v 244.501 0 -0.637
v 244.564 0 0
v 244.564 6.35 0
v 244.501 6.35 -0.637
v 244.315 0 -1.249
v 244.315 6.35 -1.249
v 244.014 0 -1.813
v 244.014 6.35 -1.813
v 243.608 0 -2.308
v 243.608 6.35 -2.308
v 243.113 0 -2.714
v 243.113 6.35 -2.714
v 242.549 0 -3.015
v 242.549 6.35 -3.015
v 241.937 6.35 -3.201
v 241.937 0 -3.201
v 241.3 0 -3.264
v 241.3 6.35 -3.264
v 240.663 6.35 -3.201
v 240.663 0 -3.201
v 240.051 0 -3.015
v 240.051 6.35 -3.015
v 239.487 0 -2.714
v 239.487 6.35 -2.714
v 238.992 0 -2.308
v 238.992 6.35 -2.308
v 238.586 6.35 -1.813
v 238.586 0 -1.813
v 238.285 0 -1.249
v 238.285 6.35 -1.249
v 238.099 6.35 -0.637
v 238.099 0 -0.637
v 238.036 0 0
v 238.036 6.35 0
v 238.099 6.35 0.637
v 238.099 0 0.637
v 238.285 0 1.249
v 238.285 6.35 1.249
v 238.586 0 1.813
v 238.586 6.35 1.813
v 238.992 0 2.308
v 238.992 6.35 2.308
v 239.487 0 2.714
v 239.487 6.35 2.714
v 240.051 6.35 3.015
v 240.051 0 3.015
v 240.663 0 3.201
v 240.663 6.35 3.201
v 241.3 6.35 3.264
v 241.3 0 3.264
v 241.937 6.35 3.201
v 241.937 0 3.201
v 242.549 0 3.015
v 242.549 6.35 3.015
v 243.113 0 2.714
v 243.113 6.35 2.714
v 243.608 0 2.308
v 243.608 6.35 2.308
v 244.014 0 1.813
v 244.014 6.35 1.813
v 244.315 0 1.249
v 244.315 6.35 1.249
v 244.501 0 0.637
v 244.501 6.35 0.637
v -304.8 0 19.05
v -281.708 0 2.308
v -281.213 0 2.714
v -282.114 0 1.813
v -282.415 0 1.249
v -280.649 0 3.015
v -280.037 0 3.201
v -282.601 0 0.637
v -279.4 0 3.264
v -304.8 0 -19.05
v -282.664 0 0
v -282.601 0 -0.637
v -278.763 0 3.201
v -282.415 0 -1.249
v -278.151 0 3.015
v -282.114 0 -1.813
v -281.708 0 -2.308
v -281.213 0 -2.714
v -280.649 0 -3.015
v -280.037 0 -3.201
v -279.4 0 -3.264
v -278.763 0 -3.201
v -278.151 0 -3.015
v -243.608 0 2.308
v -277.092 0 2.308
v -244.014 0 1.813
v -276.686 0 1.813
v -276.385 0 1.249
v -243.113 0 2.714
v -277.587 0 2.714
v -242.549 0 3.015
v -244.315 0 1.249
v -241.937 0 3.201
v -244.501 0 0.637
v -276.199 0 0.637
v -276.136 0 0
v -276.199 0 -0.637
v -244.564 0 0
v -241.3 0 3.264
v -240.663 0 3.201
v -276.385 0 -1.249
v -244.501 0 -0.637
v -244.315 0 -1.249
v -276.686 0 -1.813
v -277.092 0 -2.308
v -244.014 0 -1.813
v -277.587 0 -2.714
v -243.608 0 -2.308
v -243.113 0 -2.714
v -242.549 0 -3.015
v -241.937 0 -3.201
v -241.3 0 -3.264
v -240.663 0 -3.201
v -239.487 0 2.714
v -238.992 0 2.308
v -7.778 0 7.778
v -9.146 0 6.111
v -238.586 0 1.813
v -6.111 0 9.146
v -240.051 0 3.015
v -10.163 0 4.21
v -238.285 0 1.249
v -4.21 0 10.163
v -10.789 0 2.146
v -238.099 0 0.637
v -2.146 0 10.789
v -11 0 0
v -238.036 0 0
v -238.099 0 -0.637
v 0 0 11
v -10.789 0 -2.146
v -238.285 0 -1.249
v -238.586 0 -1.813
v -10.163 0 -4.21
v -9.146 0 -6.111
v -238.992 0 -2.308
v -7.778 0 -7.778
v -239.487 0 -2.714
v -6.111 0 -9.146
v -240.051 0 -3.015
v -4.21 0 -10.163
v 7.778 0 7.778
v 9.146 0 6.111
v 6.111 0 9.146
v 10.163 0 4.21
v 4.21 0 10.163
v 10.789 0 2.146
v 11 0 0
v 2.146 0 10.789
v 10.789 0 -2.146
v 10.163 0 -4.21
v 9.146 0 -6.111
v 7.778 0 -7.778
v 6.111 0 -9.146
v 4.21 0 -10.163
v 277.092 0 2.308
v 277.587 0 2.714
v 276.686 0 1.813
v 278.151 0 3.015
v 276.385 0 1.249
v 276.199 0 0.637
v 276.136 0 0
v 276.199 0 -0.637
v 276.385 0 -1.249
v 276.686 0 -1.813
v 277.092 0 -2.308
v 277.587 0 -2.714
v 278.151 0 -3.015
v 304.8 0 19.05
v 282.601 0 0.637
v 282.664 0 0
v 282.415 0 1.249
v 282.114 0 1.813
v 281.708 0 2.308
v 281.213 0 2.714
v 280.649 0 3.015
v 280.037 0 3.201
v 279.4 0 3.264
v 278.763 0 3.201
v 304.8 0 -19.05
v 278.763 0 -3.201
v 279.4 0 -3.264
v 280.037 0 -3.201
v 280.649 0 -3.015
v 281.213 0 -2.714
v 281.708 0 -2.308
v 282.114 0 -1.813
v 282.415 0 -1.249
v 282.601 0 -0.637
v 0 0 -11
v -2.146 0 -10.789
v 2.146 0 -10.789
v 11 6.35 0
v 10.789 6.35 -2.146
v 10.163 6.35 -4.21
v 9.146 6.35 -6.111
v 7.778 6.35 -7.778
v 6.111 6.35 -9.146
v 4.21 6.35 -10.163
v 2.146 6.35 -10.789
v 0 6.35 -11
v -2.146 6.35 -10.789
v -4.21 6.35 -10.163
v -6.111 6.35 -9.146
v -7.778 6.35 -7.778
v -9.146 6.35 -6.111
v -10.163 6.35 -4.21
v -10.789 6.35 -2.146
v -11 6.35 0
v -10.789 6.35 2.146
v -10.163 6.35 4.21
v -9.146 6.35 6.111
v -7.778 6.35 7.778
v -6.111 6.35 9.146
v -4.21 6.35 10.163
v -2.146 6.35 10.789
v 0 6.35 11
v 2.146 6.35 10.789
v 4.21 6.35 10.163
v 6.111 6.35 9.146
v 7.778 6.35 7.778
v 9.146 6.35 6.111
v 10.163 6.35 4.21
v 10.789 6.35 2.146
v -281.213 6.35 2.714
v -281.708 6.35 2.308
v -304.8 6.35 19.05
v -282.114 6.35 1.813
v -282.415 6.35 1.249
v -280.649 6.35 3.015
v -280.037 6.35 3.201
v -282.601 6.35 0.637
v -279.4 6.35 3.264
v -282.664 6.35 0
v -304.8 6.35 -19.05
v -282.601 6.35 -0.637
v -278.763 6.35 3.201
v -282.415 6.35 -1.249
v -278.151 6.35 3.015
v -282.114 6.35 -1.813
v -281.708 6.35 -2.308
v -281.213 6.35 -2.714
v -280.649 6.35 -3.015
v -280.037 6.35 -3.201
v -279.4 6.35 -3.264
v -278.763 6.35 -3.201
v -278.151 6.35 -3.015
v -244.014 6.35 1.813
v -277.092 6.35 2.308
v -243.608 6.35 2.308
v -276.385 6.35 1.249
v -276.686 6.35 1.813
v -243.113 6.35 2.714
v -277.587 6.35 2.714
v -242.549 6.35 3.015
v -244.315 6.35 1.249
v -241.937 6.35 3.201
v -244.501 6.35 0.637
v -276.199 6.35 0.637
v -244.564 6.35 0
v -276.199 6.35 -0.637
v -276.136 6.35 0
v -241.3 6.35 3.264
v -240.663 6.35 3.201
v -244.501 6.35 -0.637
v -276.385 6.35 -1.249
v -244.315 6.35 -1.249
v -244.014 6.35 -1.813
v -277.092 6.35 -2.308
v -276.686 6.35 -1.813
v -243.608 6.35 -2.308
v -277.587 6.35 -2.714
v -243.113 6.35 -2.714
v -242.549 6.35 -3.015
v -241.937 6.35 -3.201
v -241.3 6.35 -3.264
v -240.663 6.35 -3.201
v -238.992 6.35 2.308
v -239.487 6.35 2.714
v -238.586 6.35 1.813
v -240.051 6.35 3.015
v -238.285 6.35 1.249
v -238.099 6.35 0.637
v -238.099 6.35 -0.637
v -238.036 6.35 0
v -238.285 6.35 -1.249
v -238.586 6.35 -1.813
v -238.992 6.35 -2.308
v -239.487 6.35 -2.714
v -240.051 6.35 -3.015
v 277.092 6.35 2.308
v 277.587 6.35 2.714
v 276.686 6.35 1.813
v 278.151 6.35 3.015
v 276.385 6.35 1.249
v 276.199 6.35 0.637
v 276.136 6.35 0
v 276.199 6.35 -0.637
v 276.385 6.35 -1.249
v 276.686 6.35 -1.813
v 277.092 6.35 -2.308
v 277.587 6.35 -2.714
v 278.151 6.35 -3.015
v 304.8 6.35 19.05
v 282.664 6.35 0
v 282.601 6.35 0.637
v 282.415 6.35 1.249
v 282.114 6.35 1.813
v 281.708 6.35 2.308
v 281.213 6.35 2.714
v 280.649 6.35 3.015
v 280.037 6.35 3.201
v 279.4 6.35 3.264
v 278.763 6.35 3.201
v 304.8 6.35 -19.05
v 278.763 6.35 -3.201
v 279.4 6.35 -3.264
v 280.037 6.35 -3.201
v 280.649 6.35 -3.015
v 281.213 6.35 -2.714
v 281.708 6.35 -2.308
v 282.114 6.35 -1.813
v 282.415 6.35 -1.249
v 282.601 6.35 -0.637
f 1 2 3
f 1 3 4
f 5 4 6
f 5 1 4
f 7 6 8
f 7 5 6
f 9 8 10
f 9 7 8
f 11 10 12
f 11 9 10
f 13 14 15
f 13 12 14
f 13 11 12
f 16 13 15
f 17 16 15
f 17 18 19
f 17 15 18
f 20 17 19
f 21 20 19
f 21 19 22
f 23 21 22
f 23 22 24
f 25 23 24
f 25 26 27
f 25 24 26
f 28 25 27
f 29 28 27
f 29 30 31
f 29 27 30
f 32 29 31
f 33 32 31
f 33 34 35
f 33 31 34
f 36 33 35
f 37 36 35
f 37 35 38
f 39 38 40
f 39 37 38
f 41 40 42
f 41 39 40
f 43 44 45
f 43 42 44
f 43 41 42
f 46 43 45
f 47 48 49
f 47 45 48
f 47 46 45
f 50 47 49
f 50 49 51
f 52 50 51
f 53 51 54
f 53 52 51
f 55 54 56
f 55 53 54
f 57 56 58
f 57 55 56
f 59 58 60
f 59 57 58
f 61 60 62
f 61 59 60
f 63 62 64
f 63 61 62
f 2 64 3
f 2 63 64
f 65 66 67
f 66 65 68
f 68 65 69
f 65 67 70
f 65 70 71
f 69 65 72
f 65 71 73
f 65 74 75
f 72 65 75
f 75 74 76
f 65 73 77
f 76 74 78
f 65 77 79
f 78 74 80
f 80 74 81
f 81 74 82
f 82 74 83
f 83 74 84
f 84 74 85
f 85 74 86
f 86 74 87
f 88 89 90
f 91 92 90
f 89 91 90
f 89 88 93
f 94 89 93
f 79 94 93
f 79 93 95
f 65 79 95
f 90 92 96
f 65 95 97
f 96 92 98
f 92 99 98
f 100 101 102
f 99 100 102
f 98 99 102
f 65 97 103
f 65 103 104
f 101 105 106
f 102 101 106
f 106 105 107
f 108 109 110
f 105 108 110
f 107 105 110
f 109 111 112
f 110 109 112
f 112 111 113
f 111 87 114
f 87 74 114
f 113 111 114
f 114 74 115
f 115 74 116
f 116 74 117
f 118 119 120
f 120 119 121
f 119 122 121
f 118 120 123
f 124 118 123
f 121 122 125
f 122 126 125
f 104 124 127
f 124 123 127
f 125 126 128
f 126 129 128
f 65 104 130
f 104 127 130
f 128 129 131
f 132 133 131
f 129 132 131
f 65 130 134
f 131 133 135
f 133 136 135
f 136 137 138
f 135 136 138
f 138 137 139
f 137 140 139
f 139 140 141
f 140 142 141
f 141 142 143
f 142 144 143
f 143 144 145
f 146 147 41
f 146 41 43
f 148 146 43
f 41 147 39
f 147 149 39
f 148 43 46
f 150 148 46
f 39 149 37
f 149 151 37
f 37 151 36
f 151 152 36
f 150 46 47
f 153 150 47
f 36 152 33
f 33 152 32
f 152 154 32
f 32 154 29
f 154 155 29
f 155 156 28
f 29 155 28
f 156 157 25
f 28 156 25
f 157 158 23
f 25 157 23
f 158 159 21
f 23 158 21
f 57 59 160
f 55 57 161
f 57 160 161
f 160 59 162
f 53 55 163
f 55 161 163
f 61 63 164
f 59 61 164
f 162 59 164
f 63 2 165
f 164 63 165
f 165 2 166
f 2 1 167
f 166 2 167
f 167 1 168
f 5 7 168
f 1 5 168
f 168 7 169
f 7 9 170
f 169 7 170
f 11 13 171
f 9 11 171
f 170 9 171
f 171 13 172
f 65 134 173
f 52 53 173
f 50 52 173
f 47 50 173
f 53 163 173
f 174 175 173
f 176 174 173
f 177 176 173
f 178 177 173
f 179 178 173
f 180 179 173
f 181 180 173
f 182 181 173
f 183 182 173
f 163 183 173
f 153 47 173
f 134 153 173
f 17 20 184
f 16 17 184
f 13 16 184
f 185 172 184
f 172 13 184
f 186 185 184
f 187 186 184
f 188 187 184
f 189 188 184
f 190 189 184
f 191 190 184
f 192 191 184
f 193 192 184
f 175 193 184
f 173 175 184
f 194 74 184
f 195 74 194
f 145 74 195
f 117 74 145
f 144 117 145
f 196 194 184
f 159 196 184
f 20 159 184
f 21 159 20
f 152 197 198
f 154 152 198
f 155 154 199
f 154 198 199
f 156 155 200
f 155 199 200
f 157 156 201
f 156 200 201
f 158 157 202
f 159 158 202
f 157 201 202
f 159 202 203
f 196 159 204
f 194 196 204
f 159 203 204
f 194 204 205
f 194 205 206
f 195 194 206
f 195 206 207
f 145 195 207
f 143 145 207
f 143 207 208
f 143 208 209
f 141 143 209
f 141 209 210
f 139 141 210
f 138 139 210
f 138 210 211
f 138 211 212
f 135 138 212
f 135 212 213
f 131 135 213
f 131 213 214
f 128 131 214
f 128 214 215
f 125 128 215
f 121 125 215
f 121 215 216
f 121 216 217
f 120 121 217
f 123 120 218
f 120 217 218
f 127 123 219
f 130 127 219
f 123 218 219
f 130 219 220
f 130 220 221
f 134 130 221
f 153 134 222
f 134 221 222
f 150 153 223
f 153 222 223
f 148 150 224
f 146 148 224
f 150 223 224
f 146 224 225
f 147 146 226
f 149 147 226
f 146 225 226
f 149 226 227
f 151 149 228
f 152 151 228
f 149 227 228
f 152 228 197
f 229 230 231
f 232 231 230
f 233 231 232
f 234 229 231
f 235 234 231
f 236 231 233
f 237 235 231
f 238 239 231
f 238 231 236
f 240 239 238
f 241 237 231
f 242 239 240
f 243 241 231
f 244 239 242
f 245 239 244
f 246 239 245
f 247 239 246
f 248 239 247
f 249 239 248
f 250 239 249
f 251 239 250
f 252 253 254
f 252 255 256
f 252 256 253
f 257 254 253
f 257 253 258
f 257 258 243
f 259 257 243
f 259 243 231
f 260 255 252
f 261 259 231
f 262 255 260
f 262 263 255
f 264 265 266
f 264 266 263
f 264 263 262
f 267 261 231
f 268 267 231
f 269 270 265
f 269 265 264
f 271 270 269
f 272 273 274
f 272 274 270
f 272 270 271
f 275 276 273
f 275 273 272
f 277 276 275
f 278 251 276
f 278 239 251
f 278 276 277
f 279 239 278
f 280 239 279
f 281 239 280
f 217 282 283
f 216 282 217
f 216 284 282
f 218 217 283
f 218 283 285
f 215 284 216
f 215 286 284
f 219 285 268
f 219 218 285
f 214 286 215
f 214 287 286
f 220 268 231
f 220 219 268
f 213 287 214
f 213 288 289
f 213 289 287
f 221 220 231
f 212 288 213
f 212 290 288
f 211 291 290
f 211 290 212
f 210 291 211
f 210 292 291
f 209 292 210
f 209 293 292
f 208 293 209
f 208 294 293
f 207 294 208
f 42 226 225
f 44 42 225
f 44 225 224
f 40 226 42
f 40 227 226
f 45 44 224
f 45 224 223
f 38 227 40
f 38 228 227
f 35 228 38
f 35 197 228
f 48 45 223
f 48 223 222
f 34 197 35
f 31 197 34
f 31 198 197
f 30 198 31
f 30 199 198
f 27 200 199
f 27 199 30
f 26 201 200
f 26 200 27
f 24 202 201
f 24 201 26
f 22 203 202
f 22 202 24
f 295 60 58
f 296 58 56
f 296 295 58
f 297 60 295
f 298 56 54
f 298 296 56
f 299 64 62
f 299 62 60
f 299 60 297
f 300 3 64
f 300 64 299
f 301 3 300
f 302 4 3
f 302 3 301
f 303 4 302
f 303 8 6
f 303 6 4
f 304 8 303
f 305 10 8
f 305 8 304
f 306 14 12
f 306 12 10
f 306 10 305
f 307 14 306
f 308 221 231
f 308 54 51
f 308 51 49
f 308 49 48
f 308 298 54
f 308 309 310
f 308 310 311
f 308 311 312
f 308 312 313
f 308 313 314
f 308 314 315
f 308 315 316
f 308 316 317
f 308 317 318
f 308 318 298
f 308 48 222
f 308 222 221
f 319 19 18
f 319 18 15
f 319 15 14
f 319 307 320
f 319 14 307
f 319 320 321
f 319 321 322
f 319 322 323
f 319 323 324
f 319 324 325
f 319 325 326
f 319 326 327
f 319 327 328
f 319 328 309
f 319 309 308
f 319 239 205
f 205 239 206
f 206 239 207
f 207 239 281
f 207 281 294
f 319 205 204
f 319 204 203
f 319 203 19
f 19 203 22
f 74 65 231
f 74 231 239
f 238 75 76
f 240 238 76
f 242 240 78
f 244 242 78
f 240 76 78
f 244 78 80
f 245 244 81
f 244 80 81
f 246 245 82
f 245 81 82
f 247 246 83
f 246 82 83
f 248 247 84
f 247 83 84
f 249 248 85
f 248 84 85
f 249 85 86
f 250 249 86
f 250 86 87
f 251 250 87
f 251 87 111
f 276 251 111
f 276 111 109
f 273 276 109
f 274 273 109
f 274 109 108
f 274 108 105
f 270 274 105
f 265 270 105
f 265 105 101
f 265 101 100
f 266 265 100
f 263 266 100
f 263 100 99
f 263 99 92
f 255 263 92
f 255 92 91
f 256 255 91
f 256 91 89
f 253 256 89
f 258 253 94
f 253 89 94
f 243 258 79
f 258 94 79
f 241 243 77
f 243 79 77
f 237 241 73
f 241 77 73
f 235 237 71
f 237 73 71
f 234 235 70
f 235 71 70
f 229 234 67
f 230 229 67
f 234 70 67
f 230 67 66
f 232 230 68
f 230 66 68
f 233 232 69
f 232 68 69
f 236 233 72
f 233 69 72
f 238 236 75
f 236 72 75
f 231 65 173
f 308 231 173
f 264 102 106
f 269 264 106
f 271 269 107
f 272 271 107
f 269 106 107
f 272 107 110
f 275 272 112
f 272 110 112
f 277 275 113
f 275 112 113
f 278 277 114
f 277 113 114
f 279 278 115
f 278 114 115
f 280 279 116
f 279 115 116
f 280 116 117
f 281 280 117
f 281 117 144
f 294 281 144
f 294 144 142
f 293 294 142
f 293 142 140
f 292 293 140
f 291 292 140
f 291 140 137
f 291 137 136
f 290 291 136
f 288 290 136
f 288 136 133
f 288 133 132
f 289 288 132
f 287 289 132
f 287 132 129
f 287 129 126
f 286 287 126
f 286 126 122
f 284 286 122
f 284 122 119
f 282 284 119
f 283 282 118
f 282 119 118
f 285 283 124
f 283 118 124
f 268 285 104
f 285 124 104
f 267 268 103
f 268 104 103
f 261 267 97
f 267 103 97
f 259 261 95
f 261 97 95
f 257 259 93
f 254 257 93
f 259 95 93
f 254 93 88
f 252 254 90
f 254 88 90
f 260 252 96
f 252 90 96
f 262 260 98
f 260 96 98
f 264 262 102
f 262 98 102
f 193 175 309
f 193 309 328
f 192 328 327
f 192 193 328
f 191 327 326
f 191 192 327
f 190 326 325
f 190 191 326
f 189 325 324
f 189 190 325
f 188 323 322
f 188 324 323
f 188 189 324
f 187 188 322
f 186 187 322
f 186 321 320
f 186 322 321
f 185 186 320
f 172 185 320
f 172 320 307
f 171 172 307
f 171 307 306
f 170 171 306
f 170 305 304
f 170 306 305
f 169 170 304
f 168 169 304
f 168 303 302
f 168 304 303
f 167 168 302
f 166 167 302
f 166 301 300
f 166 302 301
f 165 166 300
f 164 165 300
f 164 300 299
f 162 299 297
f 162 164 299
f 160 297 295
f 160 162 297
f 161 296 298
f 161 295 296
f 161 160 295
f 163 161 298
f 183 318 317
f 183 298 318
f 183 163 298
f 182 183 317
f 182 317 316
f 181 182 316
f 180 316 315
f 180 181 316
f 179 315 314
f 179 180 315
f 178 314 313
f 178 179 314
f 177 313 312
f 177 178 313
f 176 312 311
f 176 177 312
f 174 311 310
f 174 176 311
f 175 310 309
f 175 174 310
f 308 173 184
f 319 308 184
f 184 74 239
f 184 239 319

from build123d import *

# Parameters (mm, degrees)
SKETCH1_W                = 609.6
SKETCH1_H                = 38.1
BOSS_EXTRUDE1_DEPTH      = 6.35
SKETCH2_R                = 11
CUT_EXTRUDE1_DEPTH       = 7.62
F_0_257_DIAMETER_HOLE2_D = 6.5278


with BuildPart() as part:
    # Sketch1 → Boss-Extrude1 (new body)
    with BuildSketch(Plane(origin=(0, 0, 0), x_dir=(1, 0, 0), z_dir=(0, 1, 0))):
        Rectangle(SKETCH1_W, SKETCH1_H)
    extrude(amount=BOSS_EXTRUDE1_DEPTH)

    # Sketch2 → Cut-Extrude1 (cut)
    with BuildSketch(Plane(origin=(0, 6.35, 0), x_dir=(1, 0, 0), z_dir=(0, 1, 0))):
        Circle(SKETCH2_R)
    extrude(amount=-CUT_EXTRUDE1_DEPTH, mode=Mode.SUBTRACT)

    # F (0.257) Diameter Hole2 (through all)
    with Locations(Plane(origin=(0, 6.35, 0), x_dir=(1, 0, 0), z_dir=(0, 1, 0))):
        with Locations((-241.3, 0), (-279.4, 0)):
            f_0_257_diameter_hole2 = Hole(F_0_257_DIAMETER_HOLE2_D / 2)

    # Mirror1: F (0.257) Diameter Hole2 across plane
    add(f_0_257_diameter_hole2.mirror(Plane(origin=(0, 0, 0), x_dir=(0, 0, 1), z_dir=(1, 0, 0))), mode=Mode.SUBTRACT)


solid = part.part
